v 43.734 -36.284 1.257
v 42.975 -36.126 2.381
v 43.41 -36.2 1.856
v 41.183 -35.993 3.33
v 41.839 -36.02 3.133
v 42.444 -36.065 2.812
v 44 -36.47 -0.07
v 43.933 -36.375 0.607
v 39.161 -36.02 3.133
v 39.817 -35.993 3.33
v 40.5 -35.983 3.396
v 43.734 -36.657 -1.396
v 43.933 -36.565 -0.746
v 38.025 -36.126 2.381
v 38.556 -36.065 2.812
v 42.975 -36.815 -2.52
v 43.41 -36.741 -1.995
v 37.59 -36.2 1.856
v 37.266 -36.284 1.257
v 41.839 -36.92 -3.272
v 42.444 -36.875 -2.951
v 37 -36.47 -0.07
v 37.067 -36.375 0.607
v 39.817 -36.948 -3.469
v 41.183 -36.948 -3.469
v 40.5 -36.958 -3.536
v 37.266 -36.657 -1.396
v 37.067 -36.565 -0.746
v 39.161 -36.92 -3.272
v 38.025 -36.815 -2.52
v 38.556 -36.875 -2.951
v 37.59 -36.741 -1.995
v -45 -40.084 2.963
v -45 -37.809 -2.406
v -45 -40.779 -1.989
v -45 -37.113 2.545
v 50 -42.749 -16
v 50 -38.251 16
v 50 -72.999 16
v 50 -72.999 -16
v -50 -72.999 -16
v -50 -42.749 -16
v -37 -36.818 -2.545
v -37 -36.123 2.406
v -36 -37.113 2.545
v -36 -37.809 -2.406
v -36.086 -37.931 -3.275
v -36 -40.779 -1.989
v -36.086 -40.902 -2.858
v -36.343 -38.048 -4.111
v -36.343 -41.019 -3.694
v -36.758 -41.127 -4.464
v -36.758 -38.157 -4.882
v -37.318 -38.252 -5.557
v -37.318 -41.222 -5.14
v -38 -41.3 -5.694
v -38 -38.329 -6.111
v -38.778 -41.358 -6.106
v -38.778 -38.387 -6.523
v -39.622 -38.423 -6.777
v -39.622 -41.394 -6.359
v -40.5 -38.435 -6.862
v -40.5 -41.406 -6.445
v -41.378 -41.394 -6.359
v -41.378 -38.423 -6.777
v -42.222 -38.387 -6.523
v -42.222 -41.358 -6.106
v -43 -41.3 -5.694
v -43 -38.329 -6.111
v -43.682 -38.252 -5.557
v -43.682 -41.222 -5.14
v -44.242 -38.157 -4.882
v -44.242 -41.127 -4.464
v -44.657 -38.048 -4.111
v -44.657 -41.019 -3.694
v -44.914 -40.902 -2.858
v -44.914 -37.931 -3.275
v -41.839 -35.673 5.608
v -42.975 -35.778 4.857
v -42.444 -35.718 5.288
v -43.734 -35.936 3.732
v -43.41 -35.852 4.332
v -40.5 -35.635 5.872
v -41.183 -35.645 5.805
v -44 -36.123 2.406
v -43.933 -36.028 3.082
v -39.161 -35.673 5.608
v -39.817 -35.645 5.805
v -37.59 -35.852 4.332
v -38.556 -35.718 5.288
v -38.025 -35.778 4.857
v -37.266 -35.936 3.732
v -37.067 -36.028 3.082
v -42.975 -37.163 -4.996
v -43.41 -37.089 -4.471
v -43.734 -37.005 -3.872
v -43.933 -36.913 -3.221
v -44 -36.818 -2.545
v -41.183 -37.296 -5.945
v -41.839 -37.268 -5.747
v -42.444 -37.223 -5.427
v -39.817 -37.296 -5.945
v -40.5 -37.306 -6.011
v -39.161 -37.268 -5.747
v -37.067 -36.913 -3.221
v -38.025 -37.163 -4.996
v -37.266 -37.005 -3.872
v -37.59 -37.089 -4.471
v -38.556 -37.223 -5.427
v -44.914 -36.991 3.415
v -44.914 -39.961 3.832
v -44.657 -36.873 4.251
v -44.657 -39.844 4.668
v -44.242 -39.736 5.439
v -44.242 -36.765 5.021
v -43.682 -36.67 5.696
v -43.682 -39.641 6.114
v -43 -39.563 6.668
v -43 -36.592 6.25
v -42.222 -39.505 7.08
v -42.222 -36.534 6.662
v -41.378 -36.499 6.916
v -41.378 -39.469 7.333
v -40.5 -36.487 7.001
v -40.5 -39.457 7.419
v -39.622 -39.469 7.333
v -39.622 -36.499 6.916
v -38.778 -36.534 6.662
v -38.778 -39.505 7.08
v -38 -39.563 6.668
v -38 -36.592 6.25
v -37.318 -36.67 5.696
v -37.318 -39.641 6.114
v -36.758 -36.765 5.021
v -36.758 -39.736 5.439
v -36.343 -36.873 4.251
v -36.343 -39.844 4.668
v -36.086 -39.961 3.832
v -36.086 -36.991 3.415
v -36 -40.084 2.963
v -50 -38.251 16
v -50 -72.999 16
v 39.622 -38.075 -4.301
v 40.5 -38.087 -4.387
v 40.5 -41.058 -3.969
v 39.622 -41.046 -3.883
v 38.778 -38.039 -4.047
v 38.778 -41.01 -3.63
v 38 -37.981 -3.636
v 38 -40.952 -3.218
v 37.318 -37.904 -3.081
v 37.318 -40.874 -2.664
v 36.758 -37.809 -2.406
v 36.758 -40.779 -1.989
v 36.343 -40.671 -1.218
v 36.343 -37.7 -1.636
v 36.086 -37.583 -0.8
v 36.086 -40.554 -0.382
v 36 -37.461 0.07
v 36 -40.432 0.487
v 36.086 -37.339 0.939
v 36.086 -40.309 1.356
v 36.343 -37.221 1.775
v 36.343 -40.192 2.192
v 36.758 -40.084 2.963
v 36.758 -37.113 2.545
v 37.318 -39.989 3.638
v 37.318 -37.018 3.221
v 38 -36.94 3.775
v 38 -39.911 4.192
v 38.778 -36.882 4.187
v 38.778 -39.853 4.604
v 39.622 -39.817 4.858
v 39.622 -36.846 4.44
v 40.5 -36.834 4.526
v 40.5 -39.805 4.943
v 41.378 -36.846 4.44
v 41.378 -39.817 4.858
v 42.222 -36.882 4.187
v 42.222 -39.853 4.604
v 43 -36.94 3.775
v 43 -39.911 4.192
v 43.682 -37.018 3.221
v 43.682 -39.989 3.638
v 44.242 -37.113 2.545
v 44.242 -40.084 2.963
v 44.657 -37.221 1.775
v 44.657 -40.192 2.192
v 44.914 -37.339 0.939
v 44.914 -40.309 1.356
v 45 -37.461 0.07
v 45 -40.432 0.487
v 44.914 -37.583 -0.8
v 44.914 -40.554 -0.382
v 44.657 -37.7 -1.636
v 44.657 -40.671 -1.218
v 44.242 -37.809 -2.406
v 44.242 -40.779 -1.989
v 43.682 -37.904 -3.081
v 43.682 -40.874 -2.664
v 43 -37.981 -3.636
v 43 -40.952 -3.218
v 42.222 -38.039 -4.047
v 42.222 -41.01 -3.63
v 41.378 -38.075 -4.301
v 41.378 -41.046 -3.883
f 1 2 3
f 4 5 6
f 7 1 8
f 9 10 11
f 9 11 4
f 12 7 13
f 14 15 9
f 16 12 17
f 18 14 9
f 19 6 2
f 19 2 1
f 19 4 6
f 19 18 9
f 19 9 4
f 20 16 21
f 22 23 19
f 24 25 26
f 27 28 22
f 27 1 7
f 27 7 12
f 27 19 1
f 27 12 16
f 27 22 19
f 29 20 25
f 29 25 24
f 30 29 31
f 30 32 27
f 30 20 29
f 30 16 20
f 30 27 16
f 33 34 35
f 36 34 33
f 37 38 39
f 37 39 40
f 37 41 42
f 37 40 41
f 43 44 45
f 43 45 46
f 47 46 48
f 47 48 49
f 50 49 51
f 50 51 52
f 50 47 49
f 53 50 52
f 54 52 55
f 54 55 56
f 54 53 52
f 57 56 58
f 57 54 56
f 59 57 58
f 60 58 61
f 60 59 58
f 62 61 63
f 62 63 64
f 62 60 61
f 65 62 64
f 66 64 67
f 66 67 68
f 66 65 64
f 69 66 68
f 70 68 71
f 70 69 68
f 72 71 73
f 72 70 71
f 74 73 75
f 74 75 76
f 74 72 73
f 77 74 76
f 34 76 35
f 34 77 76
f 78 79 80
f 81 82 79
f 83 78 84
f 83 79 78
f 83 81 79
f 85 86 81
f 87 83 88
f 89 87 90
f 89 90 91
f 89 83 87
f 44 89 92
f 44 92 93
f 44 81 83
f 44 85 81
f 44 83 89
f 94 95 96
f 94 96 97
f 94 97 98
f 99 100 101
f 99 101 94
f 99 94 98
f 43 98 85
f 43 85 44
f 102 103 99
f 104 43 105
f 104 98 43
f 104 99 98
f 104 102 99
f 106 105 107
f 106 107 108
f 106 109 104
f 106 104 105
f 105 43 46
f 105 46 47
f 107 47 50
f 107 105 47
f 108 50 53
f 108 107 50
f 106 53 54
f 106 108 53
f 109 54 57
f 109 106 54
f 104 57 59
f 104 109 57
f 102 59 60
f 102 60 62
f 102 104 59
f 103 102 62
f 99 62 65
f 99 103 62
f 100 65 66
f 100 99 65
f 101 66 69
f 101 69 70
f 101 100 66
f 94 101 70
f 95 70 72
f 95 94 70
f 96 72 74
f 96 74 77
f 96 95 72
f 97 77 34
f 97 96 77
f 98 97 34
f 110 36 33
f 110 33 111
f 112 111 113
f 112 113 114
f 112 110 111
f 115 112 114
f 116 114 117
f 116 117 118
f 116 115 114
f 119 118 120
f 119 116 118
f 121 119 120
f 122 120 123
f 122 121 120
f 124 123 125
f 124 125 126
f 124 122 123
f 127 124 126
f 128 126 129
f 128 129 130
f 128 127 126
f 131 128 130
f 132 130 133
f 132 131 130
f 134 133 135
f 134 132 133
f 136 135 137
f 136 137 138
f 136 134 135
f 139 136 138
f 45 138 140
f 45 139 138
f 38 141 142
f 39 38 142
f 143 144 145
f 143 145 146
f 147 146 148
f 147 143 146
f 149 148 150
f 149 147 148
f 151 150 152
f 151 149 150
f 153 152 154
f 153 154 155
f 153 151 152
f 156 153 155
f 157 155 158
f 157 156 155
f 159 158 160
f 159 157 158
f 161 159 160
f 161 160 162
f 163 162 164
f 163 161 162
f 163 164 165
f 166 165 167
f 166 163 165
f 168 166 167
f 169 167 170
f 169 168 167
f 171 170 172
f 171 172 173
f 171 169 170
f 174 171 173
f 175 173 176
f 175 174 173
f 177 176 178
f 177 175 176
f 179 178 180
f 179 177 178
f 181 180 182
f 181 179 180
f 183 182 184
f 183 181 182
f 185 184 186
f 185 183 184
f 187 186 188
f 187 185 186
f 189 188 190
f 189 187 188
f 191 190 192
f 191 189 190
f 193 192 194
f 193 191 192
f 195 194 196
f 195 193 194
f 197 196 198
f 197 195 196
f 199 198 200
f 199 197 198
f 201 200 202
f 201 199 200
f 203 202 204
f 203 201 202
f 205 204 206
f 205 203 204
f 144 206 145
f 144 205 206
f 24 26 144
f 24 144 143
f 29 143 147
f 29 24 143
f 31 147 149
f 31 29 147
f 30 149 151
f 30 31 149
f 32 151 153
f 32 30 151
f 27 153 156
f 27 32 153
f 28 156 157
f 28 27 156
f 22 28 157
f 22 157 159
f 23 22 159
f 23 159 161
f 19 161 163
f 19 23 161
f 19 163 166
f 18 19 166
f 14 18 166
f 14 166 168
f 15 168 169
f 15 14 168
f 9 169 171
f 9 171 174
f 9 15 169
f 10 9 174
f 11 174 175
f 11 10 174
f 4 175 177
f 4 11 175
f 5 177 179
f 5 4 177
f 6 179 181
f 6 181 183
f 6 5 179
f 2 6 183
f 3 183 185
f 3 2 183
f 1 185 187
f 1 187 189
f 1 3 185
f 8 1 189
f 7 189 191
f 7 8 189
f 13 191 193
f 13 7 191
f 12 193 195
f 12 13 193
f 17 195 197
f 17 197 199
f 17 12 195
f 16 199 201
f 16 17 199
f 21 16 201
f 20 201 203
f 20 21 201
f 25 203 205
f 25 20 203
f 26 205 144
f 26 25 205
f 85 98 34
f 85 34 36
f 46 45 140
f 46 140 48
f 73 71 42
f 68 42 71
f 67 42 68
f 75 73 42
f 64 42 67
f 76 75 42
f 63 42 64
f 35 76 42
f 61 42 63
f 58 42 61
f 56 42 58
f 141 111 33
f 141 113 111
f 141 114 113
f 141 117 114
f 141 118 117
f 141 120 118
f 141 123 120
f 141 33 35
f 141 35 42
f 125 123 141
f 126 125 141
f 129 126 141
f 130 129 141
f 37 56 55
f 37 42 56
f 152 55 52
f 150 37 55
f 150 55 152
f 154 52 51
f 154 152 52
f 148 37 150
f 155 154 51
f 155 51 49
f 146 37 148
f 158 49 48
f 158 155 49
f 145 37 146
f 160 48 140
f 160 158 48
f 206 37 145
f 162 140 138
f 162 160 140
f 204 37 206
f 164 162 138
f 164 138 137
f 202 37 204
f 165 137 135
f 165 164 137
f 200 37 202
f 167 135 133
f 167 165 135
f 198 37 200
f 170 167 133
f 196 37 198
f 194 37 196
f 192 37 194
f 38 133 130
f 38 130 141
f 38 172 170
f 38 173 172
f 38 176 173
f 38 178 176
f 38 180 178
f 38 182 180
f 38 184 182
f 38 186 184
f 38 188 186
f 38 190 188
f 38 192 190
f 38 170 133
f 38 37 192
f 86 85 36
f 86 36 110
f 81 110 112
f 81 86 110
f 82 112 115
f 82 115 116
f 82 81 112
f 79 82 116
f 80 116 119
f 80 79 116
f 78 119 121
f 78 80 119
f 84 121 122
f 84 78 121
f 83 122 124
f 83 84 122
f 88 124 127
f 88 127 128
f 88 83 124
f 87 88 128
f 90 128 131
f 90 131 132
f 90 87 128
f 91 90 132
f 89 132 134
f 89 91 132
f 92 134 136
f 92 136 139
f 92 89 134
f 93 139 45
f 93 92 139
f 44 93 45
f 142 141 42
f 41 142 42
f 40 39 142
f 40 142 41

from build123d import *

# Parameters (mm, degrees)
EXTRUDE_1_DEPTH     = 16
CUT_EXTRUDE_1_DEPTH = 50
EXTRUDE_2_DEPTH     = 28.5
SKETCH_4_R          = 4.5
CUT_EXTRUDE_2_DEPTH = 28.5
EXTRUDE_3_DEPTH     = 50
EXTRUDE_START       = 4
SKETCH_6_R          = 4.5
EXTRUDE_4_DEPTH     = 4
CUT_EXTRUDE_3_DEPTH = 60
CHAMFER_1_SIZE      = 1


with BuildPart() as part:
    # 草图1 → 凸台-拉伸1 (new, symmetric)
    with BuildSketch(Plane.XY):
        with BuildLine():
            Line((-17, 0), (-17, -66.86388681))
            Line((-17, -66.86388681), (-20.5, -66.86388681))
            Line((-20.5, -66.86388681), (-20.5, 0))
            ThreePointArc((-20.5, 0), (0, 20.5), (20.5, 0))
            Line((20.5, 0), (20.5, -66.86388681))
            Line((20.5, -66.86388681), (17, -66.86388681))
            Line((17, -66.86388681), (17, 0))
            ThreePointArc((17, 0), (0, 17), (-17, 0))
        make_face()
    extrude(amount=EXTRUDE_1_DEPTH, both=True)

    # 草图2 → 切除-拉伸1 (cut, symmetric)
    with BuildSketch(Plane(origin=(0, 0, 0), x_dir=(0, 0, -1), z_dir=(1, 0, 0))):
        Polygon((16, -42.748653355), (-16, -38.251346645), (-16, -66.86388681), (16, -66.86388681), align=None)
    extrude(amount=CUT_EXTRUDE_1_DEPTH, both=True, mode=Mode.SUBTRACT)

    # 草图3 → 凸台-拉伸2 (add)
    with BuildSketch(Plane.ZY.offset(20.5)):
        Polygon((-16, -42.748653355), (16, -38.251346645), (16, -34.716950141), (-16, -39.214256851), align=None)
    extrude_2 = extrude(amount=EXTRUDE_2_DEPTH)

    # 镜向1: 凸台-拉伸2 across plane
    add(extrude_2.mirror(Plane(origin=(0, 0, 0), x_dir=(0, 0, 1), z_dir=(1, 0, 0))))

    # 草图4 → 切除-拉伸2 (cut)
    with BuildSketch(Plane(origin=(0, -36.249611102, 5.094550602), x_dir=(1, 0, 0), z_dir=(0, 0.9902680687415715, -0.13917310096005808))):
        with Locations(Location((40.5, 5.144617667, 0), (0, 0, 270))):
            Circle(SKETCH_4_R)
        with BuildLine():
            Line((-36, 7.644617667), (-36, 2.644617667))
            ThreePointArc((-36, 2.644617667), (-40.5, -1.855382333), (-45, 2.644617667))
            Line((-45, 2.644617667), (-45, 7.644617667))
            ThreePointArc((-45, 7.644617667), (-40.5, 12.144617667), (-36, 7.644617667))
        make_face()
    extrude(amount=-CUT_EXTRUDE_2_DEPTH, mode=Mode.SUBTRACT)

    # 草图8 → 切除-拉伸3 (cut, symmetric)
    with BuildSketch(Plane(origin=(0, 0, 0), x_dir=(0, 0, -1), z_dir=(1, 0, 0))):
        Polygon((16, -42.748653355), (-16, -38.251346645), (-16, 32.293524638), (16, 32.293524638), align=None)
    extrude(amount=CUT_EXTRUDE_3_DEPTH, both=True, mode=Mode.SUBTRACT)


with BuildPart() as body_2:
    # 草图5 → 凸台-拉伸3 (new, symmetric)
    with BuildSketch(Plane(origin=(0, 0, 0), x_dir=(0, 0, -1), z_dir=(1, 0, 0))):
        Polygon((16, -42.748653355), (-16, -38.251346645), (-16, -72.998653355), (16, -72.998653355), align=None)
    extrude(amount=EXTRUDE_3_DEPTH, both=True)

    # 草图6 → 凸台-拉伸4 (add)
    with BuildSketch(Plane(origin=(0, -39.715549343, 5.581656455), x_dir=(1, 0, 0), z_dir=(0, 0.9902680687415714, -0.139173100960058)).offset(EXTRUDE_START)):
        with Locations(Location((40.5, 5.144617667, 0), (0, 0, 90))):
            Circle(SKETCH_6_R)
        with BuildLine():
            Line((-36, 2.644617667), (-36, 7.644617667))
            ThreePointArc((-36, 7.644617667), (-40.5, 12.144617667), (-45, 7.644617667))
            Line((-45, 7.644617667), (-45, 2.644617667))
            ThreePointArc((-45, 2.644617667), (-40.5, -1.855382333), (-36, 2.644617667))
        make_face()
    extrude(amount=-EXTRUDE_4_DEPTH)

    # 倒角1
    chamfer_1_edges = [body_2.edges().sort_by_distance(p)[0] for p in [
        (-40.5, -35.496257755, 6.862289931),
        (-36, -36.470469462, -0.06958655),
        (-40.5, -37.444681169, -7.001463032),
        (-45, -36.470469462, -0.06958655),
        (40.5, -35.844190507, 4.386619759),
    ]]
    chamfer(chamfer_1_edges, length=CHAMFER_1_SIZE)


solid = body_2.part
